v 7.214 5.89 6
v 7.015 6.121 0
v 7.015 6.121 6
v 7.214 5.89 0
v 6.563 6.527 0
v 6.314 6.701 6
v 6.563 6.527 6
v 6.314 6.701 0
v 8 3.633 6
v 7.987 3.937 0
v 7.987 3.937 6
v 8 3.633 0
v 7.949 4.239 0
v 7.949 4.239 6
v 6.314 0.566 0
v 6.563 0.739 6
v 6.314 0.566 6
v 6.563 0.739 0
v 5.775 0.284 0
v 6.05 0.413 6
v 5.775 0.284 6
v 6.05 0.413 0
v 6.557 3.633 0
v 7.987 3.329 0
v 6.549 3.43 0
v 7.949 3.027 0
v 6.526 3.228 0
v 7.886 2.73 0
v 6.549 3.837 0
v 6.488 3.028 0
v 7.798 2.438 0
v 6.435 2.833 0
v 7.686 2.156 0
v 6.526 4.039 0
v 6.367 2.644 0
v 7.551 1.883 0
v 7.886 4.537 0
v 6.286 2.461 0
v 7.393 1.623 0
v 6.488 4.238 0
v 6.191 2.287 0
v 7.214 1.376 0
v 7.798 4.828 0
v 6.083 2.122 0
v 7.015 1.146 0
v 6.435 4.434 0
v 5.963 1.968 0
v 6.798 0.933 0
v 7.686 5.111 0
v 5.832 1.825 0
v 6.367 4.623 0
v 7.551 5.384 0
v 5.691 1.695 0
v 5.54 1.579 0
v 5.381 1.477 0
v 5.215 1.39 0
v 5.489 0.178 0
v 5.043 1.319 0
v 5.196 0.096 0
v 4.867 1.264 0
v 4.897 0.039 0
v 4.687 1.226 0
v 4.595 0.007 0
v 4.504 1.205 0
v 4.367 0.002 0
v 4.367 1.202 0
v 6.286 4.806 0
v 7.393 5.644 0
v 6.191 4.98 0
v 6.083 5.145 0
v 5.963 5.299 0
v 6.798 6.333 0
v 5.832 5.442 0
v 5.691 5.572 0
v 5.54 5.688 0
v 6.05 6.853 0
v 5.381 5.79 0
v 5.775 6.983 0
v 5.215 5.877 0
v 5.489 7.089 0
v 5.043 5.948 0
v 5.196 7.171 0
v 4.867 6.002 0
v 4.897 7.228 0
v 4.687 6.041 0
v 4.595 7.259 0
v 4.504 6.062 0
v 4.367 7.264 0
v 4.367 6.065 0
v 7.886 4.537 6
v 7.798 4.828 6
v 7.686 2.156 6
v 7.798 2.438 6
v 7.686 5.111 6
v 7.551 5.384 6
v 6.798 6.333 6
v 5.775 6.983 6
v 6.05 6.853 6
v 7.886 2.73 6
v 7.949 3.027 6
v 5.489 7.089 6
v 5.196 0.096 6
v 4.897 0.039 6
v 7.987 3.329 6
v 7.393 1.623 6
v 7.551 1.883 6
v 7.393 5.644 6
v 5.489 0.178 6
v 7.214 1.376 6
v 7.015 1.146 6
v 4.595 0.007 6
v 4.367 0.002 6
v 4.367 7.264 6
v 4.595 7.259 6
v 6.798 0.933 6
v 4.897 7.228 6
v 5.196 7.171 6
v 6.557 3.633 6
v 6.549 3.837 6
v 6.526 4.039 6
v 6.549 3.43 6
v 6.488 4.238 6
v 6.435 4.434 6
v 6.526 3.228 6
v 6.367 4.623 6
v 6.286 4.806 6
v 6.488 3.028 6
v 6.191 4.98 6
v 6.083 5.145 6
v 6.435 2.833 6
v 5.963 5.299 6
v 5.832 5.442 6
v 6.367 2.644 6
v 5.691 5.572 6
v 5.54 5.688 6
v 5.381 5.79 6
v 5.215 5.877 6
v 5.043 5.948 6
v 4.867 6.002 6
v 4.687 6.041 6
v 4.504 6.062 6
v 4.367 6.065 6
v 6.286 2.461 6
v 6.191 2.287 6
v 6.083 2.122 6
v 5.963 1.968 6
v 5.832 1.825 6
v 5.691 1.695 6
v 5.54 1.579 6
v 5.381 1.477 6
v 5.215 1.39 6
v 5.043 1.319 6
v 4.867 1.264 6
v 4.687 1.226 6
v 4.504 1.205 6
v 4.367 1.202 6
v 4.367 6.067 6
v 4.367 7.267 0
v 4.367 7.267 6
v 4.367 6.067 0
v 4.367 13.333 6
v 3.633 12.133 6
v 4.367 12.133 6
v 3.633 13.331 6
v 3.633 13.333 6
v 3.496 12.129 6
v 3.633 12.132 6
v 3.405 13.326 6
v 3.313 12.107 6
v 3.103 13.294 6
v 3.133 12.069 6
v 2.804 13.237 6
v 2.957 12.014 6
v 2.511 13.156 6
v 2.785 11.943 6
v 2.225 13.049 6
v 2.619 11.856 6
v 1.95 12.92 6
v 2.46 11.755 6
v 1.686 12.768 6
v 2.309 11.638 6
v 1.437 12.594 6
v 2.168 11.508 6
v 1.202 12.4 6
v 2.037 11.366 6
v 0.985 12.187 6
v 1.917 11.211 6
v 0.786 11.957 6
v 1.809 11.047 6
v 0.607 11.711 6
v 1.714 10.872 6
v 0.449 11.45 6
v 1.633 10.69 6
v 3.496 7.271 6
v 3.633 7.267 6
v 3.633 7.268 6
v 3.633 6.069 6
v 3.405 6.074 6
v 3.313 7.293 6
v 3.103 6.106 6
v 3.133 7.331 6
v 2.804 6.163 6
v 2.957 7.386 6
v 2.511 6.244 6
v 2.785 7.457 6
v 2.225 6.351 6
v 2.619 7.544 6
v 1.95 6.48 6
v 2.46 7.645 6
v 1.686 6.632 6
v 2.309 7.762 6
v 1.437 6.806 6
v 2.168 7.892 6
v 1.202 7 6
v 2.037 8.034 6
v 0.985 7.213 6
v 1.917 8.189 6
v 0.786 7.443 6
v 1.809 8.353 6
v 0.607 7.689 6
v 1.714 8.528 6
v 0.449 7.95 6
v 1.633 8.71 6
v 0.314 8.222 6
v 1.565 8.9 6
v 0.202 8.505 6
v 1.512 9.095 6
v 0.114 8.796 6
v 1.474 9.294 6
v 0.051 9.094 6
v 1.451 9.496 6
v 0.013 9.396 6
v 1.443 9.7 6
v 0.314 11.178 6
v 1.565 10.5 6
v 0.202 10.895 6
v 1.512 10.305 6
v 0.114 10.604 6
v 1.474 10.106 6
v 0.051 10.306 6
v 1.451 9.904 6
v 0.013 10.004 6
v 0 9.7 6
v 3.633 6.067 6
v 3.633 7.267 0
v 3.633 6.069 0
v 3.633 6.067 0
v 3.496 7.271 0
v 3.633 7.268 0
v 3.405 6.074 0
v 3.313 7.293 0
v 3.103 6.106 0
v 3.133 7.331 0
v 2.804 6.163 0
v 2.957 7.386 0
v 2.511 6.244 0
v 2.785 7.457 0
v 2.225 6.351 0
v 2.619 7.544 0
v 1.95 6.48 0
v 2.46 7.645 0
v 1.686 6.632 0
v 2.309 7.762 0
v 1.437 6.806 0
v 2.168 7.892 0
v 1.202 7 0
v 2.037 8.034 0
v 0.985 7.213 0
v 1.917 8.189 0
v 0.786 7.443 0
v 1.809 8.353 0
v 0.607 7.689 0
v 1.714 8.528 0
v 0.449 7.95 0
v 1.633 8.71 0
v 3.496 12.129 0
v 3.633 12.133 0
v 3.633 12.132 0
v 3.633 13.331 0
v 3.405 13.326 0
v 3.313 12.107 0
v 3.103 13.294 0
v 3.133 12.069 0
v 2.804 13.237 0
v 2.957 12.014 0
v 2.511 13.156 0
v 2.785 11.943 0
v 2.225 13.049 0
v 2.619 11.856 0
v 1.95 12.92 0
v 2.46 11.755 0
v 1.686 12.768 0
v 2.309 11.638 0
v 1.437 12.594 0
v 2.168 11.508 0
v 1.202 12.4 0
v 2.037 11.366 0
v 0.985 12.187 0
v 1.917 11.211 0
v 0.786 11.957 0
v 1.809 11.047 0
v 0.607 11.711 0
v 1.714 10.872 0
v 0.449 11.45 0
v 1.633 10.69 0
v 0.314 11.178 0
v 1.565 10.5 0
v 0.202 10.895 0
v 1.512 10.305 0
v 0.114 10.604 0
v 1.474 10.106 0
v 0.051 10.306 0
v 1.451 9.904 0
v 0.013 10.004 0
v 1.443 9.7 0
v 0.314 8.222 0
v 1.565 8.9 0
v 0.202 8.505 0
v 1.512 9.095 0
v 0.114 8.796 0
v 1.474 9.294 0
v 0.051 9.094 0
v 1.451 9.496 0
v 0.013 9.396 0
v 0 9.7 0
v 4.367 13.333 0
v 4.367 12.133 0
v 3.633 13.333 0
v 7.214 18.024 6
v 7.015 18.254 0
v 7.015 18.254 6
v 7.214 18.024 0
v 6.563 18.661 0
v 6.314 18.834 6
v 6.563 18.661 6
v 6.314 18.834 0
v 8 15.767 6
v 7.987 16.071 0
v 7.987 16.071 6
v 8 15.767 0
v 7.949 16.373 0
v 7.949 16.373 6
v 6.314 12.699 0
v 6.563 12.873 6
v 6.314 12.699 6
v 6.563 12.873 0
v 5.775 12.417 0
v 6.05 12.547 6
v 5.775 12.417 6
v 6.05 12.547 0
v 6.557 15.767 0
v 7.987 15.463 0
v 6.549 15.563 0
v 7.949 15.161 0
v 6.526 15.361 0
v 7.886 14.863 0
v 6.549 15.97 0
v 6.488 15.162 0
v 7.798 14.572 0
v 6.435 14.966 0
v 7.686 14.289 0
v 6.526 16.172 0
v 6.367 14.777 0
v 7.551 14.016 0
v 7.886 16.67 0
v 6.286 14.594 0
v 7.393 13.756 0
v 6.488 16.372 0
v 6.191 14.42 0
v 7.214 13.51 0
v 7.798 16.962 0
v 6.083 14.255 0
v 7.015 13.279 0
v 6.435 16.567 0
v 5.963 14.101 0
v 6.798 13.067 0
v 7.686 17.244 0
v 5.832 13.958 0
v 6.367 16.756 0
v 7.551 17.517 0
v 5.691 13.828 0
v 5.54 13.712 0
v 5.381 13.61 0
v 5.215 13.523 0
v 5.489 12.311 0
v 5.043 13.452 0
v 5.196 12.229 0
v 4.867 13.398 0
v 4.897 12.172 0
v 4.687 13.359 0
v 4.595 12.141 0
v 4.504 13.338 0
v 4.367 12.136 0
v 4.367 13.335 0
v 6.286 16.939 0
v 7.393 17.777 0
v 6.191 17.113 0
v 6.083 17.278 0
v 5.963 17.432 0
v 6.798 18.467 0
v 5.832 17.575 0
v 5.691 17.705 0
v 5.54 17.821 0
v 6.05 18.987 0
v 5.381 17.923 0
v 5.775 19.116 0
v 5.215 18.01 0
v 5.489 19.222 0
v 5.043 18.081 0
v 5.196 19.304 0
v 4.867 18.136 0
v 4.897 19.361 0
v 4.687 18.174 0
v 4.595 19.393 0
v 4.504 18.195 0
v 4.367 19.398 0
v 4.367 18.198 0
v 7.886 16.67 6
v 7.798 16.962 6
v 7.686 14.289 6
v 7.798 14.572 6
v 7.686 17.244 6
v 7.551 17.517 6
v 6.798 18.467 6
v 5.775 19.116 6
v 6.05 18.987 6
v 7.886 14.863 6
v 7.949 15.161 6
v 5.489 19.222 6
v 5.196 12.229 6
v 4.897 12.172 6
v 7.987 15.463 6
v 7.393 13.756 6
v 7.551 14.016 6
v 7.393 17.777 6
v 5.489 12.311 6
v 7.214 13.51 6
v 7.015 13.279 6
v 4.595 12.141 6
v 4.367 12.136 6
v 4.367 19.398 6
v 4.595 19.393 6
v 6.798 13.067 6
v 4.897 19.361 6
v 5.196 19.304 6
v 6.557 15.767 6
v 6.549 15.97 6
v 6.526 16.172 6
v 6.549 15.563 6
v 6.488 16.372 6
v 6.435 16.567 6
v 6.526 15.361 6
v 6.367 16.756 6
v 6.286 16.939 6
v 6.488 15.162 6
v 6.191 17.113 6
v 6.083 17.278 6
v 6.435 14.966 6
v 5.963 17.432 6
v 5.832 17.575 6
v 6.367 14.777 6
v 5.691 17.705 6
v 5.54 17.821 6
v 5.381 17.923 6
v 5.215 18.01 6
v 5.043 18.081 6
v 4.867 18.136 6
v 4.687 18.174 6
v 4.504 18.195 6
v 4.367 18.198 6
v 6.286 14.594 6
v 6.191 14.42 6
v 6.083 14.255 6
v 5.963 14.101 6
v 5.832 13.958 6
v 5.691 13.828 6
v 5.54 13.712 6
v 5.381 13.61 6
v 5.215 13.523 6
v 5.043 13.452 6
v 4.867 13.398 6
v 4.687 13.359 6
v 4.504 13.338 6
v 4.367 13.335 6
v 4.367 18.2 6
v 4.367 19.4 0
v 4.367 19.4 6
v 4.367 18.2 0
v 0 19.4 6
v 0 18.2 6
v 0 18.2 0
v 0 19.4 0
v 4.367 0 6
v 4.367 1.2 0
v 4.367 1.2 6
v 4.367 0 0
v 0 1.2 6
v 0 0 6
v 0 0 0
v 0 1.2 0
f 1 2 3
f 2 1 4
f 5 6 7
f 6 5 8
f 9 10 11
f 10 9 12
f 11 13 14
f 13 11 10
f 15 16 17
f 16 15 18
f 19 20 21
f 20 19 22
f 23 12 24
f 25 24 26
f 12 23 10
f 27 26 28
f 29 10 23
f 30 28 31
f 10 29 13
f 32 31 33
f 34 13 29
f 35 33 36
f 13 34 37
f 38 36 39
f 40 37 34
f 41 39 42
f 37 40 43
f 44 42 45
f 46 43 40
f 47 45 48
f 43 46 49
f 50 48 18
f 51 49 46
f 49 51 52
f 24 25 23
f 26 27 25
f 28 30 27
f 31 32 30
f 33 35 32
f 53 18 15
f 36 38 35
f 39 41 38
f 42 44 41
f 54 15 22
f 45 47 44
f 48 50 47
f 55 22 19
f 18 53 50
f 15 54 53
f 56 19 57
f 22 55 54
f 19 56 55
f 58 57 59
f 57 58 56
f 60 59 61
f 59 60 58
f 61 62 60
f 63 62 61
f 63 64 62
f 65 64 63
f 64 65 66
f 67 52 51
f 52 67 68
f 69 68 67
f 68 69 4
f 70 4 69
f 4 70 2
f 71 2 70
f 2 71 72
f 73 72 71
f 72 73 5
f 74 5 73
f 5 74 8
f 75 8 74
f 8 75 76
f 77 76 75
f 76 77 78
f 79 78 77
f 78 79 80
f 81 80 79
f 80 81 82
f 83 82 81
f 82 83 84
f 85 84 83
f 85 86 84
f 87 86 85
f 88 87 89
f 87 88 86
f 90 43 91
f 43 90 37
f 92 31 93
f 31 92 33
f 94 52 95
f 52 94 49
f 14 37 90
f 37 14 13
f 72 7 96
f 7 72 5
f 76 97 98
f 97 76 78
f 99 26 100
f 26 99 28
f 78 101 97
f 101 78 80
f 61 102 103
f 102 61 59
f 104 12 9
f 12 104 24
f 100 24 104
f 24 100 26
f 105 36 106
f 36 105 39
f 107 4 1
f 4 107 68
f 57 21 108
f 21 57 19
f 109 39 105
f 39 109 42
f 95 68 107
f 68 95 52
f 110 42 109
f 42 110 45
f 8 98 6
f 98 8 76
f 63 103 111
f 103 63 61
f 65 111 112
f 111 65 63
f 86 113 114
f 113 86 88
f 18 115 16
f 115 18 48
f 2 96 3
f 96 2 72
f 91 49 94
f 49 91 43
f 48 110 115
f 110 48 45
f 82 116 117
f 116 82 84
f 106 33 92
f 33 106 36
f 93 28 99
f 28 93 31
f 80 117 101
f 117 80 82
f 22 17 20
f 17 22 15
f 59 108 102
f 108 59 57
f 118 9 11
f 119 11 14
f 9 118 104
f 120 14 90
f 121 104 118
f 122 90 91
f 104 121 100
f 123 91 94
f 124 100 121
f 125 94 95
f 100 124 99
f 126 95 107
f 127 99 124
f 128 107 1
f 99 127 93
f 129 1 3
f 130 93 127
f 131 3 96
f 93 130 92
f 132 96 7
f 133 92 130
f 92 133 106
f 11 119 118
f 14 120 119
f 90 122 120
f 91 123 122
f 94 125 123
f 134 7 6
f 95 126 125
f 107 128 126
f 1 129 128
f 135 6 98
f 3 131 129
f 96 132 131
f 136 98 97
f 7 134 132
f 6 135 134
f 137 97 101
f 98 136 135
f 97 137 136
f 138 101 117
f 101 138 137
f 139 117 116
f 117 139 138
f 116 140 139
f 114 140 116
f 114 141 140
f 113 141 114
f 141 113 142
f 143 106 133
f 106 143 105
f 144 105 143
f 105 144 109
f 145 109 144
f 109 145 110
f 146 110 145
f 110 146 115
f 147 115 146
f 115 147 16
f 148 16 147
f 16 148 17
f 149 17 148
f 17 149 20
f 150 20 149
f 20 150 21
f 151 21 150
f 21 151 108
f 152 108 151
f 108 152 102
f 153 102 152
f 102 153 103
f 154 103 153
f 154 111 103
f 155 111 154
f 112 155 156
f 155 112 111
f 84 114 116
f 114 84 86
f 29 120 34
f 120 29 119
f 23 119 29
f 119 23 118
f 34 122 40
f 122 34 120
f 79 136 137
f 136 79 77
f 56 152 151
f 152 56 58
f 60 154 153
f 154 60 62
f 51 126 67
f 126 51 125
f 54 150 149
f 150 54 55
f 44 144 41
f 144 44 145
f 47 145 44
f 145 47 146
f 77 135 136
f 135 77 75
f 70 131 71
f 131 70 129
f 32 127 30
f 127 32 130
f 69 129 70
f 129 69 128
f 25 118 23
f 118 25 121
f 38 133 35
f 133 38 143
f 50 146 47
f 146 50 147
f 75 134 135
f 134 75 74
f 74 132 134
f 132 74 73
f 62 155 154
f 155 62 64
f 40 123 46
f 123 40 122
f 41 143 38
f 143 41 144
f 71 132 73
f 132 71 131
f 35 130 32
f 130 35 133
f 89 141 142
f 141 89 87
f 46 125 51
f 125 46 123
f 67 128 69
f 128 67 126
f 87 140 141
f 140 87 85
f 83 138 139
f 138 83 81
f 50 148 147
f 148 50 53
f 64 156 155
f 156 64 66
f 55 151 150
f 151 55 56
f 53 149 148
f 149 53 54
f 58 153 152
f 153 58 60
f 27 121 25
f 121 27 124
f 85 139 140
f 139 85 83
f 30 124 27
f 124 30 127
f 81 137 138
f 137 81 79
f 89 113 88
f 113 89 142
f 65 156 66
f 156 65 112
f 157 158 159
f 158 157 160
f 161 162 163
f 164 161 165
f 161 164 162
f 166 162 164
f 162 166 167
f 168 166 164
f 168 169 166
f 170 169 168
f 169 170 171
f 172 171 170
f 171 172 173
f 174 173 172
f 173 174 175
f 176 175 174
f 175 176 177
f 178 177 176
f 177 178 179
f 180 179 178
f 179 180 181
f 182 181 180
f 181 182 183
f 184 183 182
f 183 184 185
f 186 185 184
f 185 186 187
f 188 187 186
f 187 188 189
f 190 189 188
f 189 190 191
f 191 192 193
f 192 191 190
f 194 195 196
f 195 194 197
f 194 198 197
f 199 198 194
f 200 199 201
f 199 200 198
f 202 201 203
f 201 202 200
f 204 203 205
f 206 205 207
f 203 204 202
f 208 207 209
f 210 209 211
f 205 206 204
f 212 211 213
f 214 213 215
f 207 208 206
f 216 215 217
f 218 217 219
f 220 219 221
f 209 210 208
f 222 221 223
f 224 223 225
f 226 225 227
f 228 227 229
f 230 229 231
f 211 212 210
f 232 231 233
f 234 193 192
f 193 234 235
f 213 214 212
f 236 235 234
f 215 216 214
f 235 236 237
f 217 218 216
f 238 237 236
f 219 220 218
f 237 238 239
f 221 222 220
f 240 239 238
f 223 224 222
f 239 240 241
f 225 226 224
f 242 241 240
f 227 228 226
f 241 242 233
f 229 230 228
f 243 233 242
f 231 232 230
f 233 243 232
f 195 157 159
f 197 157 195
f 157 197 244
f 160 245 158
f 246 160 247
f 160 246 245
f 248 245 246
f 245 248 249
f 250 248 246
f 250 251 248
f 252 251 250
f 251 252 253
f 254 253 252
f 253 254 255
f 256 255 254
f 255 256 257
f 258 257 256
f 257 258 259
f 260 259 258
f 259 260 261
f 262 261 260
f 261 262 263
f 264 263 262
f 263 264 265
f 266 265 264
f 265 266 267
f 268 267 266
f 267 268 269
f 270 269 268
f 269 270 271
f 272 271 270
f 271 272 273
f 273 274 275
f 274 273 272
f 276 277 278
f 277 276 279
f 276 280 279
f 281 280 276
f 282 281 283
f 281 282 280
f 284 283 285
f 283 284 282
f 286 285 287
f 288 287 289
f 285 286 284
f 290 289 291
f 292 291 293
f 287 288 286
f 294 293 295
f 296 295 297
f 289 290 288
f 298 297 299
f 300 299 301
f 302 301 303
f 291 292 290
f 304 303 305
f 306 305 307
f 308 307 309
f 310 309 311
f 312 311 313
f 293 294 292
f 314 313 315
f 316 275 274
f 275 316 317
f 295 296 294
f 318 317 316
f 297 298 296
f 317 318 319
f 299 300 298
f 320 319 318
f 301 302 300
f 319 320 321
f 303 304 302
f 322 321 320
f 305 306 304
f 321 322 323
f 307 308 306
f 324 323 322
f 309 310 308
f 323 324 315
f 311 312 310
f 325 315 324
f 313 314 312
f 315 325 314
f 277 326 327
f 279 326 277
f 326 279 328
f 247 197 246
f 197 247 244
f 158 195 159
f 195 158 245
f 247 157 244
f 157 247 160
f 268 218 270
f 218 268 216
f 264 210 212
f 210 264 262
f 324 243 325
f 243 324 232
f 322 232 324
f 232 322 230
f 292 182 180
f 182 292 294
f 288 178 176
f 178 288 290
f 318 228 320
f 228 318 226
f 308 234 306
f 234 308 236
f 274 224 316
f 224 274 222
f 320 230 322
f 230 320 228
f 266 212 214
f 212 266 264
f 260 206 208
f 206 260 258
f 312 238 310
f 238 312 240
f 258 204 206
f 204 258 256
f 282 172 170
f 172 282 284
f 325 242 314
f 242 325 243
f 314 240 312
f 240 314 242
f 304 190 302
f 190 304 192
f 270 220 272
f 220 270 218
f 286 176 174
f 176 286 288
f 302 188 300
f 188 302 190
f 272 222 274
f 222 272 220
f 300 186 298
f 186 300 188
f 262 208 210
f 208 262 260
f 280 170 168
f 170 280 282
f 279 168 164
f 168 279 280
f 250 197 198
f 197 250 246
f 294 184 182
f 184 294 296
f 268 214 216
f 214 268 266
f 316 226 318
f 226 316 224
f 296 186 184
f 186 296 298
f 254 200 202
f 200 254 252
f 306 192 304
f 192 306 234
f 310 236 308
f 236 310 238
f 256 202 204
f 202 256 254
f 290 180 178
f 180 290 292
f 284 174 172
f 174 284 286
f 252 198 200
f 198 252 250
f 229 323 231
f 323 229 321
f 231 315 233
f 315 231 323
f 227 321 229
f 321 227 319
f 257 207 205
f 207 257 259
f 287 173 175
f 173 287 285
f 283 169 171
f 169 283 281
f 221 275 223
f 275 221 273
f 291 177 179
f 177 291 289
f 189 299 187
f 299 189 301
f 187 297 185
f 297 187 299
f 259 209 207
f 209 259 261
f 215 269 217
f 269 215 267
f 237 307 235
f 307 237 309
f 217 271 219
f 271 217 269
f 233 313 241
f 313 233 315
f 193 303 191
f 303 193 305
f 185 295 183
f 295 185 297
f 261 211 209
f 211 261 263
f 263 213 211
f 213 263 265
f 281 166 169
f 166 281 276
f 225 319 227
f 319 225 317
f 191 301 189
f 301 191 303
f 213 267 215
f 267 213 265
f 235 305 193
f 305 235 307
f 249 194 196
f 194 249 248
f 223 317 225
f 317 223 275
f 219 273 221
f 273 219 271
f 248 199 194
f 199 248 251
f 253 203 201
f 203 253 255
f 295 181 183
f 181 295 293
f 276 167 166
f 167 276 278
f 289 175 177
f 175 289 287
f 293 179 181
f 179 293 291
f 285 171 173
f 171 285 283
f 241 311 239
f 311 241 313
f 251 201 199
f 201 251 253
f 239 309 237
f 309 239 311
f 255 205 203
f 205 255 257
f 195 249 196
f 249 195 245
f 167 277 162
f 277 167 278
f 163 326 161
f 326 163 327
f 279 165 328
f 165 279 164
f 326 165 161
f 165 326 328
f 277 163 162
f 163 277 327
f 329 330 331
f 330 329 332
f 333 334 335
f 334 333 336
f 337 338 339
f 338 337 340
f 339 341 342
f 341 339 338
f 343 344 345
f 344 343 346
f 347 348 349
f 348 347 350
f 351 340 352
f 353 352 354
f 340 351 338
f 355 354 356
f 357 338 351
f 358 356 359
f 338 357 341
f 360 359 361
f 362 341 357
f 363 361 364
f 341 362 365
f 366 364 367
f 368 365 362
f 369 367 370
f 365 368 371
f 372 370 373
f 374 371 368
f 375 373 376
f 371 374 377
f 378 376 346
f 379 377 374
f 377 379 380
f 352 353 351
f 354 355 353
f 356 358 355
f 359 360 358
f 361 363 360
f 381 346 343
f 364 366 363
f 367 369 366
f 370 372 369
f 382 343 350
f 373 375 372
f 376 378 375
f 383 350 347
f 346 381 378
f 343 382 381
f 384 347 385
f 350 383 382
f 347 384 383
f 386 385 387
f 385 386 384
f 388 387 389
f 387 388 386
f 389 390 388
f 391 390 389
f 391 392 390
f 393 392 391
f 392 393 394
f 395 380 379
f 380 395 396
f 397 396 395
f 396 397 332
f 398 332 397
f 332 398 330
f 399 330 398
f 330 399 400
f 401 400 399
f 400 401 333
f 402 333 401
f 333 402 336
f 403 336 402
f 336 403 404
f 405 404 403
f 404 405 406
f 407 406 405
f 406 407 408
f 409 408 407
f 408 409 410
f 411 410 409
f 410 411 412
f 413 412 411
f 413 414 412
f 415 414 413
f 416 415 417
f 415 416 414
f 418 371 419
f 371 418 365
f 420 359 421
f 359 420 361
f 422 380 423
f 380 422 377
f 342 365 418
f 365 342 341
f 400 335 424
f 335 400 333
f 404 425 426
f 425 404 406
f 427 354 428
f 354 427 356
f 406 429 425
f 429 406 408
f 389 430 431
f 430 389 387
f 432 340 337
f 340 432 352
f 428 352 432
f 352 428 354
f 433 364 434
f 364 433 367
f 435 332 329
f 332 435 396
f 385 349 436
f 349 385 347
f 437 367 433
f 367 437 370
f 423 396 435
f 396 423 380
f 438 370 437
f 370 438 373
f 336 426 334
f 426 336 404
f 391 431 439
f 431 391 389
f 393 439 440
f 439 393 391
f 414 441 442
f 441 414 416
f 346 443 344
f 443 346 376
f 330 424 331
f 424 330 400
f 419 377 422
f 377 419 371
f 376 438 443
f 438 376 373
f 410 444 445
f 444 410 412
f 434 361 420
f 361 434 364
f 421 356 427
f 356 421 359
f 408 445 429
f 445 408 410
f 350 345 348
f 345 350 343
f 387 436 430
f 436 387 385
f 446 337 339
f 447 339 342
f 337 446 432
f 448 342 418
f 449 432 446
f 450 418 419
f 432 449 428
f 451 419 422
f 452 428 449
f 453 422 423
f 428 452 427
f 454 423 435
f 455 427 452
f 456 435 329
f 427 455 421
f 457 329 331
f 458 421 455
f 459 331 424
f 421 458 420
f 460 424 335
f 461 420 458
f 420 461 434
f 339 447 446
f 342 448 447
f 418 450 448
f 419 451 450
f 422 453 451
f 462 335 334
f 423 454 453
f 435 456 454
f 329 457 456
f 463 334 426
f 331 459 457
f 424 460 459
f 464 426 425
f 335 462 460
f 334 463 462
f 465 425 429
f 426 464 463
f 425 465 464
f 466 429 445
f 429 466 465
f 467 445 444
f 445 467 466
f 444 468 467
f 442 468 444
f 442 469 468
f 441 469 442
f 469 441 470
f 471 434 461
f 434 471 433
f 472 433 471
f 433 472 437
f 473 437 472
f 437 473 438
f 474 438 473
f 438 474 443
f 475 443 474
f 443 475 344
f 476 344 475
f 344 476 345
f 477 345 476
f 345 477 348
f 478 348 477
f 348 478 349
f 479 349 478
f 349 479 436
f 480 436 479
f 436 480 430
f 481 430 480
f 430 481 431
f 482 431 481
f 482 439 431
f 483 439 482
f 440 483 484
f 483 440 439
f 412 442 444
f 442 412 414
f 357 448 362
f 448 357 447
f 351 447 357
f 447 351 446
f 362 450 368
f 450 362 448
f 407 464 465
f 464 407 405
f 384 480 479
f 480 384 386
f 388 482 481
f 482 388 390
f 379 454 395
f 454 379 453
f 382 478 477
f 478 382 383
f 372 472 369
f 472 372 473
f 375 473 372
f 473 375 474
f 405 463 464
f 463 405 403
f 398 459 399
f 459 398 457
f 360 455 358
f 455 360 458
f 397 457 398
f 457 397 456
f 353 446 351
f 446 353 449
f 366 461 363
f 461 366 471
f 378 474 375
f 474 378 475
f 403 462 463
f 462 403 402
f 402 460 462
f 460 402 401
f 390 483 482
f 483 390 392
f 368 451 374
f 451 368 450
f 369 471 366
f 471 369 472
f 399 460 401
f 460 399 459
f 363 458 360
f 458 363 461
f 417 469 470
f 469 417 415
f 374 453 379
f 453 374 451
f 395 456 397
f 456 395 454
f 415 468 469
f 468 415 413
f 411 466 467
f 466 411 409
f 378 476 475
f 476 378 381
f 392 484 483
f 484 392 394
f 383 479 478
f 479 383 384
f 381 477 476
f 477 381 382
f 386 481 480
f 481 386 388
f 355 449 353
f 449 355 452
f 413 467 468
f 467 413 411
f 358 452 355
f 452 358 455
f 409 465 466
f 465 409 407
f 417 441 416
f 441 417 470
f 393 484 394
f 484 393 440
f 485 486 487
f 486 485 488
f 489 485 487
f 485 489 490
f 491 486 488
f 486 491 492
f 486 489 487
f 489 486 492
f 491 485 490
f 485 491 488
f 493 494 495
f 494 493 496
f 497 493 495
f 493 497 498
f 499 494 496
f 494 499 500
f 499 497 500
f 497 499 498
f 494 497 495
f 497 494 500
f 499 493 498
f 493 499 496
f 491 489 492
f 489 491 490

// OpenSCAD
thkInPlane = 1.20000000;
widthInPlane = 8.00000000;
heightInPlane = 20.00000000;
numberOfSectionsSet = 3.00000000;
thkOutOfPlane = 6.00000000;
numberOfSections = floor(numberOfSectionsSet);
radius = 0.5 * (heightInPlane/numberOfSections + thkInPlane/2);
$fn=75;

spring();

module halfCylinder(rad, thk)
{
	difference() {
		difference() {
			scale([1,1,1]) cylinder(r=radius, h=thk, center=true);
			scale([0.9,1,1]) cylinder(r=radius-thkInPlane, h=thk+2, center=true);
		};
	translate([-rad,0,0]) cube([2*rad,2*rad,thk+2], center=true);
	};
}

module spring() {
cube([widthInPlane-radius, thkInPlane, thkOutOfPlane], center=false);
for (i=[1:numberOfSections]) {
	echo(i);
	if (i%2 != 0) {
		echo("in the first if-loop");
		translate([widthInPlane-radius,2*(i-1)*radius+radius-(i-1)*thkInPlane,thkOutOfPlane/2])
		halfCylinder(radius, thkOutOfPlane);
		translate([radius,2*i*radius-i*thkInPlane,0])
		cube([widthInPlane-2*radius,thkInPlane,thkOutOfPlane], center=false);
	}
	else {
		echo("in the else-loop");
		translate([radius,(2*i-1)*radius-(i-1)*thkInPlane,thkOutOfPlane/2])
		rotate([0,0,180])
		halfCylinder(radius, thkOutOfPlane);
		translate([radius,2*i*radius-i*thkInPlane,0])
		cube([widthInPlane-2*radius,thkInPlane,thkOutOfPlane], center=false);
	}
}
if (numberOfSections%2 != 0) {
translate([0,numberOfSections*(2*radius-thkInPlane),0])
cube([radius, thkInPlane, thkOutOfPlane], center=false);
}
else {
translate([widthInPlane-radius,numberOfSections*(2*radius-thkInPlane),0])
	cube([radius, thkInPlane, thkOutOfPlane], center=false);
}
}
